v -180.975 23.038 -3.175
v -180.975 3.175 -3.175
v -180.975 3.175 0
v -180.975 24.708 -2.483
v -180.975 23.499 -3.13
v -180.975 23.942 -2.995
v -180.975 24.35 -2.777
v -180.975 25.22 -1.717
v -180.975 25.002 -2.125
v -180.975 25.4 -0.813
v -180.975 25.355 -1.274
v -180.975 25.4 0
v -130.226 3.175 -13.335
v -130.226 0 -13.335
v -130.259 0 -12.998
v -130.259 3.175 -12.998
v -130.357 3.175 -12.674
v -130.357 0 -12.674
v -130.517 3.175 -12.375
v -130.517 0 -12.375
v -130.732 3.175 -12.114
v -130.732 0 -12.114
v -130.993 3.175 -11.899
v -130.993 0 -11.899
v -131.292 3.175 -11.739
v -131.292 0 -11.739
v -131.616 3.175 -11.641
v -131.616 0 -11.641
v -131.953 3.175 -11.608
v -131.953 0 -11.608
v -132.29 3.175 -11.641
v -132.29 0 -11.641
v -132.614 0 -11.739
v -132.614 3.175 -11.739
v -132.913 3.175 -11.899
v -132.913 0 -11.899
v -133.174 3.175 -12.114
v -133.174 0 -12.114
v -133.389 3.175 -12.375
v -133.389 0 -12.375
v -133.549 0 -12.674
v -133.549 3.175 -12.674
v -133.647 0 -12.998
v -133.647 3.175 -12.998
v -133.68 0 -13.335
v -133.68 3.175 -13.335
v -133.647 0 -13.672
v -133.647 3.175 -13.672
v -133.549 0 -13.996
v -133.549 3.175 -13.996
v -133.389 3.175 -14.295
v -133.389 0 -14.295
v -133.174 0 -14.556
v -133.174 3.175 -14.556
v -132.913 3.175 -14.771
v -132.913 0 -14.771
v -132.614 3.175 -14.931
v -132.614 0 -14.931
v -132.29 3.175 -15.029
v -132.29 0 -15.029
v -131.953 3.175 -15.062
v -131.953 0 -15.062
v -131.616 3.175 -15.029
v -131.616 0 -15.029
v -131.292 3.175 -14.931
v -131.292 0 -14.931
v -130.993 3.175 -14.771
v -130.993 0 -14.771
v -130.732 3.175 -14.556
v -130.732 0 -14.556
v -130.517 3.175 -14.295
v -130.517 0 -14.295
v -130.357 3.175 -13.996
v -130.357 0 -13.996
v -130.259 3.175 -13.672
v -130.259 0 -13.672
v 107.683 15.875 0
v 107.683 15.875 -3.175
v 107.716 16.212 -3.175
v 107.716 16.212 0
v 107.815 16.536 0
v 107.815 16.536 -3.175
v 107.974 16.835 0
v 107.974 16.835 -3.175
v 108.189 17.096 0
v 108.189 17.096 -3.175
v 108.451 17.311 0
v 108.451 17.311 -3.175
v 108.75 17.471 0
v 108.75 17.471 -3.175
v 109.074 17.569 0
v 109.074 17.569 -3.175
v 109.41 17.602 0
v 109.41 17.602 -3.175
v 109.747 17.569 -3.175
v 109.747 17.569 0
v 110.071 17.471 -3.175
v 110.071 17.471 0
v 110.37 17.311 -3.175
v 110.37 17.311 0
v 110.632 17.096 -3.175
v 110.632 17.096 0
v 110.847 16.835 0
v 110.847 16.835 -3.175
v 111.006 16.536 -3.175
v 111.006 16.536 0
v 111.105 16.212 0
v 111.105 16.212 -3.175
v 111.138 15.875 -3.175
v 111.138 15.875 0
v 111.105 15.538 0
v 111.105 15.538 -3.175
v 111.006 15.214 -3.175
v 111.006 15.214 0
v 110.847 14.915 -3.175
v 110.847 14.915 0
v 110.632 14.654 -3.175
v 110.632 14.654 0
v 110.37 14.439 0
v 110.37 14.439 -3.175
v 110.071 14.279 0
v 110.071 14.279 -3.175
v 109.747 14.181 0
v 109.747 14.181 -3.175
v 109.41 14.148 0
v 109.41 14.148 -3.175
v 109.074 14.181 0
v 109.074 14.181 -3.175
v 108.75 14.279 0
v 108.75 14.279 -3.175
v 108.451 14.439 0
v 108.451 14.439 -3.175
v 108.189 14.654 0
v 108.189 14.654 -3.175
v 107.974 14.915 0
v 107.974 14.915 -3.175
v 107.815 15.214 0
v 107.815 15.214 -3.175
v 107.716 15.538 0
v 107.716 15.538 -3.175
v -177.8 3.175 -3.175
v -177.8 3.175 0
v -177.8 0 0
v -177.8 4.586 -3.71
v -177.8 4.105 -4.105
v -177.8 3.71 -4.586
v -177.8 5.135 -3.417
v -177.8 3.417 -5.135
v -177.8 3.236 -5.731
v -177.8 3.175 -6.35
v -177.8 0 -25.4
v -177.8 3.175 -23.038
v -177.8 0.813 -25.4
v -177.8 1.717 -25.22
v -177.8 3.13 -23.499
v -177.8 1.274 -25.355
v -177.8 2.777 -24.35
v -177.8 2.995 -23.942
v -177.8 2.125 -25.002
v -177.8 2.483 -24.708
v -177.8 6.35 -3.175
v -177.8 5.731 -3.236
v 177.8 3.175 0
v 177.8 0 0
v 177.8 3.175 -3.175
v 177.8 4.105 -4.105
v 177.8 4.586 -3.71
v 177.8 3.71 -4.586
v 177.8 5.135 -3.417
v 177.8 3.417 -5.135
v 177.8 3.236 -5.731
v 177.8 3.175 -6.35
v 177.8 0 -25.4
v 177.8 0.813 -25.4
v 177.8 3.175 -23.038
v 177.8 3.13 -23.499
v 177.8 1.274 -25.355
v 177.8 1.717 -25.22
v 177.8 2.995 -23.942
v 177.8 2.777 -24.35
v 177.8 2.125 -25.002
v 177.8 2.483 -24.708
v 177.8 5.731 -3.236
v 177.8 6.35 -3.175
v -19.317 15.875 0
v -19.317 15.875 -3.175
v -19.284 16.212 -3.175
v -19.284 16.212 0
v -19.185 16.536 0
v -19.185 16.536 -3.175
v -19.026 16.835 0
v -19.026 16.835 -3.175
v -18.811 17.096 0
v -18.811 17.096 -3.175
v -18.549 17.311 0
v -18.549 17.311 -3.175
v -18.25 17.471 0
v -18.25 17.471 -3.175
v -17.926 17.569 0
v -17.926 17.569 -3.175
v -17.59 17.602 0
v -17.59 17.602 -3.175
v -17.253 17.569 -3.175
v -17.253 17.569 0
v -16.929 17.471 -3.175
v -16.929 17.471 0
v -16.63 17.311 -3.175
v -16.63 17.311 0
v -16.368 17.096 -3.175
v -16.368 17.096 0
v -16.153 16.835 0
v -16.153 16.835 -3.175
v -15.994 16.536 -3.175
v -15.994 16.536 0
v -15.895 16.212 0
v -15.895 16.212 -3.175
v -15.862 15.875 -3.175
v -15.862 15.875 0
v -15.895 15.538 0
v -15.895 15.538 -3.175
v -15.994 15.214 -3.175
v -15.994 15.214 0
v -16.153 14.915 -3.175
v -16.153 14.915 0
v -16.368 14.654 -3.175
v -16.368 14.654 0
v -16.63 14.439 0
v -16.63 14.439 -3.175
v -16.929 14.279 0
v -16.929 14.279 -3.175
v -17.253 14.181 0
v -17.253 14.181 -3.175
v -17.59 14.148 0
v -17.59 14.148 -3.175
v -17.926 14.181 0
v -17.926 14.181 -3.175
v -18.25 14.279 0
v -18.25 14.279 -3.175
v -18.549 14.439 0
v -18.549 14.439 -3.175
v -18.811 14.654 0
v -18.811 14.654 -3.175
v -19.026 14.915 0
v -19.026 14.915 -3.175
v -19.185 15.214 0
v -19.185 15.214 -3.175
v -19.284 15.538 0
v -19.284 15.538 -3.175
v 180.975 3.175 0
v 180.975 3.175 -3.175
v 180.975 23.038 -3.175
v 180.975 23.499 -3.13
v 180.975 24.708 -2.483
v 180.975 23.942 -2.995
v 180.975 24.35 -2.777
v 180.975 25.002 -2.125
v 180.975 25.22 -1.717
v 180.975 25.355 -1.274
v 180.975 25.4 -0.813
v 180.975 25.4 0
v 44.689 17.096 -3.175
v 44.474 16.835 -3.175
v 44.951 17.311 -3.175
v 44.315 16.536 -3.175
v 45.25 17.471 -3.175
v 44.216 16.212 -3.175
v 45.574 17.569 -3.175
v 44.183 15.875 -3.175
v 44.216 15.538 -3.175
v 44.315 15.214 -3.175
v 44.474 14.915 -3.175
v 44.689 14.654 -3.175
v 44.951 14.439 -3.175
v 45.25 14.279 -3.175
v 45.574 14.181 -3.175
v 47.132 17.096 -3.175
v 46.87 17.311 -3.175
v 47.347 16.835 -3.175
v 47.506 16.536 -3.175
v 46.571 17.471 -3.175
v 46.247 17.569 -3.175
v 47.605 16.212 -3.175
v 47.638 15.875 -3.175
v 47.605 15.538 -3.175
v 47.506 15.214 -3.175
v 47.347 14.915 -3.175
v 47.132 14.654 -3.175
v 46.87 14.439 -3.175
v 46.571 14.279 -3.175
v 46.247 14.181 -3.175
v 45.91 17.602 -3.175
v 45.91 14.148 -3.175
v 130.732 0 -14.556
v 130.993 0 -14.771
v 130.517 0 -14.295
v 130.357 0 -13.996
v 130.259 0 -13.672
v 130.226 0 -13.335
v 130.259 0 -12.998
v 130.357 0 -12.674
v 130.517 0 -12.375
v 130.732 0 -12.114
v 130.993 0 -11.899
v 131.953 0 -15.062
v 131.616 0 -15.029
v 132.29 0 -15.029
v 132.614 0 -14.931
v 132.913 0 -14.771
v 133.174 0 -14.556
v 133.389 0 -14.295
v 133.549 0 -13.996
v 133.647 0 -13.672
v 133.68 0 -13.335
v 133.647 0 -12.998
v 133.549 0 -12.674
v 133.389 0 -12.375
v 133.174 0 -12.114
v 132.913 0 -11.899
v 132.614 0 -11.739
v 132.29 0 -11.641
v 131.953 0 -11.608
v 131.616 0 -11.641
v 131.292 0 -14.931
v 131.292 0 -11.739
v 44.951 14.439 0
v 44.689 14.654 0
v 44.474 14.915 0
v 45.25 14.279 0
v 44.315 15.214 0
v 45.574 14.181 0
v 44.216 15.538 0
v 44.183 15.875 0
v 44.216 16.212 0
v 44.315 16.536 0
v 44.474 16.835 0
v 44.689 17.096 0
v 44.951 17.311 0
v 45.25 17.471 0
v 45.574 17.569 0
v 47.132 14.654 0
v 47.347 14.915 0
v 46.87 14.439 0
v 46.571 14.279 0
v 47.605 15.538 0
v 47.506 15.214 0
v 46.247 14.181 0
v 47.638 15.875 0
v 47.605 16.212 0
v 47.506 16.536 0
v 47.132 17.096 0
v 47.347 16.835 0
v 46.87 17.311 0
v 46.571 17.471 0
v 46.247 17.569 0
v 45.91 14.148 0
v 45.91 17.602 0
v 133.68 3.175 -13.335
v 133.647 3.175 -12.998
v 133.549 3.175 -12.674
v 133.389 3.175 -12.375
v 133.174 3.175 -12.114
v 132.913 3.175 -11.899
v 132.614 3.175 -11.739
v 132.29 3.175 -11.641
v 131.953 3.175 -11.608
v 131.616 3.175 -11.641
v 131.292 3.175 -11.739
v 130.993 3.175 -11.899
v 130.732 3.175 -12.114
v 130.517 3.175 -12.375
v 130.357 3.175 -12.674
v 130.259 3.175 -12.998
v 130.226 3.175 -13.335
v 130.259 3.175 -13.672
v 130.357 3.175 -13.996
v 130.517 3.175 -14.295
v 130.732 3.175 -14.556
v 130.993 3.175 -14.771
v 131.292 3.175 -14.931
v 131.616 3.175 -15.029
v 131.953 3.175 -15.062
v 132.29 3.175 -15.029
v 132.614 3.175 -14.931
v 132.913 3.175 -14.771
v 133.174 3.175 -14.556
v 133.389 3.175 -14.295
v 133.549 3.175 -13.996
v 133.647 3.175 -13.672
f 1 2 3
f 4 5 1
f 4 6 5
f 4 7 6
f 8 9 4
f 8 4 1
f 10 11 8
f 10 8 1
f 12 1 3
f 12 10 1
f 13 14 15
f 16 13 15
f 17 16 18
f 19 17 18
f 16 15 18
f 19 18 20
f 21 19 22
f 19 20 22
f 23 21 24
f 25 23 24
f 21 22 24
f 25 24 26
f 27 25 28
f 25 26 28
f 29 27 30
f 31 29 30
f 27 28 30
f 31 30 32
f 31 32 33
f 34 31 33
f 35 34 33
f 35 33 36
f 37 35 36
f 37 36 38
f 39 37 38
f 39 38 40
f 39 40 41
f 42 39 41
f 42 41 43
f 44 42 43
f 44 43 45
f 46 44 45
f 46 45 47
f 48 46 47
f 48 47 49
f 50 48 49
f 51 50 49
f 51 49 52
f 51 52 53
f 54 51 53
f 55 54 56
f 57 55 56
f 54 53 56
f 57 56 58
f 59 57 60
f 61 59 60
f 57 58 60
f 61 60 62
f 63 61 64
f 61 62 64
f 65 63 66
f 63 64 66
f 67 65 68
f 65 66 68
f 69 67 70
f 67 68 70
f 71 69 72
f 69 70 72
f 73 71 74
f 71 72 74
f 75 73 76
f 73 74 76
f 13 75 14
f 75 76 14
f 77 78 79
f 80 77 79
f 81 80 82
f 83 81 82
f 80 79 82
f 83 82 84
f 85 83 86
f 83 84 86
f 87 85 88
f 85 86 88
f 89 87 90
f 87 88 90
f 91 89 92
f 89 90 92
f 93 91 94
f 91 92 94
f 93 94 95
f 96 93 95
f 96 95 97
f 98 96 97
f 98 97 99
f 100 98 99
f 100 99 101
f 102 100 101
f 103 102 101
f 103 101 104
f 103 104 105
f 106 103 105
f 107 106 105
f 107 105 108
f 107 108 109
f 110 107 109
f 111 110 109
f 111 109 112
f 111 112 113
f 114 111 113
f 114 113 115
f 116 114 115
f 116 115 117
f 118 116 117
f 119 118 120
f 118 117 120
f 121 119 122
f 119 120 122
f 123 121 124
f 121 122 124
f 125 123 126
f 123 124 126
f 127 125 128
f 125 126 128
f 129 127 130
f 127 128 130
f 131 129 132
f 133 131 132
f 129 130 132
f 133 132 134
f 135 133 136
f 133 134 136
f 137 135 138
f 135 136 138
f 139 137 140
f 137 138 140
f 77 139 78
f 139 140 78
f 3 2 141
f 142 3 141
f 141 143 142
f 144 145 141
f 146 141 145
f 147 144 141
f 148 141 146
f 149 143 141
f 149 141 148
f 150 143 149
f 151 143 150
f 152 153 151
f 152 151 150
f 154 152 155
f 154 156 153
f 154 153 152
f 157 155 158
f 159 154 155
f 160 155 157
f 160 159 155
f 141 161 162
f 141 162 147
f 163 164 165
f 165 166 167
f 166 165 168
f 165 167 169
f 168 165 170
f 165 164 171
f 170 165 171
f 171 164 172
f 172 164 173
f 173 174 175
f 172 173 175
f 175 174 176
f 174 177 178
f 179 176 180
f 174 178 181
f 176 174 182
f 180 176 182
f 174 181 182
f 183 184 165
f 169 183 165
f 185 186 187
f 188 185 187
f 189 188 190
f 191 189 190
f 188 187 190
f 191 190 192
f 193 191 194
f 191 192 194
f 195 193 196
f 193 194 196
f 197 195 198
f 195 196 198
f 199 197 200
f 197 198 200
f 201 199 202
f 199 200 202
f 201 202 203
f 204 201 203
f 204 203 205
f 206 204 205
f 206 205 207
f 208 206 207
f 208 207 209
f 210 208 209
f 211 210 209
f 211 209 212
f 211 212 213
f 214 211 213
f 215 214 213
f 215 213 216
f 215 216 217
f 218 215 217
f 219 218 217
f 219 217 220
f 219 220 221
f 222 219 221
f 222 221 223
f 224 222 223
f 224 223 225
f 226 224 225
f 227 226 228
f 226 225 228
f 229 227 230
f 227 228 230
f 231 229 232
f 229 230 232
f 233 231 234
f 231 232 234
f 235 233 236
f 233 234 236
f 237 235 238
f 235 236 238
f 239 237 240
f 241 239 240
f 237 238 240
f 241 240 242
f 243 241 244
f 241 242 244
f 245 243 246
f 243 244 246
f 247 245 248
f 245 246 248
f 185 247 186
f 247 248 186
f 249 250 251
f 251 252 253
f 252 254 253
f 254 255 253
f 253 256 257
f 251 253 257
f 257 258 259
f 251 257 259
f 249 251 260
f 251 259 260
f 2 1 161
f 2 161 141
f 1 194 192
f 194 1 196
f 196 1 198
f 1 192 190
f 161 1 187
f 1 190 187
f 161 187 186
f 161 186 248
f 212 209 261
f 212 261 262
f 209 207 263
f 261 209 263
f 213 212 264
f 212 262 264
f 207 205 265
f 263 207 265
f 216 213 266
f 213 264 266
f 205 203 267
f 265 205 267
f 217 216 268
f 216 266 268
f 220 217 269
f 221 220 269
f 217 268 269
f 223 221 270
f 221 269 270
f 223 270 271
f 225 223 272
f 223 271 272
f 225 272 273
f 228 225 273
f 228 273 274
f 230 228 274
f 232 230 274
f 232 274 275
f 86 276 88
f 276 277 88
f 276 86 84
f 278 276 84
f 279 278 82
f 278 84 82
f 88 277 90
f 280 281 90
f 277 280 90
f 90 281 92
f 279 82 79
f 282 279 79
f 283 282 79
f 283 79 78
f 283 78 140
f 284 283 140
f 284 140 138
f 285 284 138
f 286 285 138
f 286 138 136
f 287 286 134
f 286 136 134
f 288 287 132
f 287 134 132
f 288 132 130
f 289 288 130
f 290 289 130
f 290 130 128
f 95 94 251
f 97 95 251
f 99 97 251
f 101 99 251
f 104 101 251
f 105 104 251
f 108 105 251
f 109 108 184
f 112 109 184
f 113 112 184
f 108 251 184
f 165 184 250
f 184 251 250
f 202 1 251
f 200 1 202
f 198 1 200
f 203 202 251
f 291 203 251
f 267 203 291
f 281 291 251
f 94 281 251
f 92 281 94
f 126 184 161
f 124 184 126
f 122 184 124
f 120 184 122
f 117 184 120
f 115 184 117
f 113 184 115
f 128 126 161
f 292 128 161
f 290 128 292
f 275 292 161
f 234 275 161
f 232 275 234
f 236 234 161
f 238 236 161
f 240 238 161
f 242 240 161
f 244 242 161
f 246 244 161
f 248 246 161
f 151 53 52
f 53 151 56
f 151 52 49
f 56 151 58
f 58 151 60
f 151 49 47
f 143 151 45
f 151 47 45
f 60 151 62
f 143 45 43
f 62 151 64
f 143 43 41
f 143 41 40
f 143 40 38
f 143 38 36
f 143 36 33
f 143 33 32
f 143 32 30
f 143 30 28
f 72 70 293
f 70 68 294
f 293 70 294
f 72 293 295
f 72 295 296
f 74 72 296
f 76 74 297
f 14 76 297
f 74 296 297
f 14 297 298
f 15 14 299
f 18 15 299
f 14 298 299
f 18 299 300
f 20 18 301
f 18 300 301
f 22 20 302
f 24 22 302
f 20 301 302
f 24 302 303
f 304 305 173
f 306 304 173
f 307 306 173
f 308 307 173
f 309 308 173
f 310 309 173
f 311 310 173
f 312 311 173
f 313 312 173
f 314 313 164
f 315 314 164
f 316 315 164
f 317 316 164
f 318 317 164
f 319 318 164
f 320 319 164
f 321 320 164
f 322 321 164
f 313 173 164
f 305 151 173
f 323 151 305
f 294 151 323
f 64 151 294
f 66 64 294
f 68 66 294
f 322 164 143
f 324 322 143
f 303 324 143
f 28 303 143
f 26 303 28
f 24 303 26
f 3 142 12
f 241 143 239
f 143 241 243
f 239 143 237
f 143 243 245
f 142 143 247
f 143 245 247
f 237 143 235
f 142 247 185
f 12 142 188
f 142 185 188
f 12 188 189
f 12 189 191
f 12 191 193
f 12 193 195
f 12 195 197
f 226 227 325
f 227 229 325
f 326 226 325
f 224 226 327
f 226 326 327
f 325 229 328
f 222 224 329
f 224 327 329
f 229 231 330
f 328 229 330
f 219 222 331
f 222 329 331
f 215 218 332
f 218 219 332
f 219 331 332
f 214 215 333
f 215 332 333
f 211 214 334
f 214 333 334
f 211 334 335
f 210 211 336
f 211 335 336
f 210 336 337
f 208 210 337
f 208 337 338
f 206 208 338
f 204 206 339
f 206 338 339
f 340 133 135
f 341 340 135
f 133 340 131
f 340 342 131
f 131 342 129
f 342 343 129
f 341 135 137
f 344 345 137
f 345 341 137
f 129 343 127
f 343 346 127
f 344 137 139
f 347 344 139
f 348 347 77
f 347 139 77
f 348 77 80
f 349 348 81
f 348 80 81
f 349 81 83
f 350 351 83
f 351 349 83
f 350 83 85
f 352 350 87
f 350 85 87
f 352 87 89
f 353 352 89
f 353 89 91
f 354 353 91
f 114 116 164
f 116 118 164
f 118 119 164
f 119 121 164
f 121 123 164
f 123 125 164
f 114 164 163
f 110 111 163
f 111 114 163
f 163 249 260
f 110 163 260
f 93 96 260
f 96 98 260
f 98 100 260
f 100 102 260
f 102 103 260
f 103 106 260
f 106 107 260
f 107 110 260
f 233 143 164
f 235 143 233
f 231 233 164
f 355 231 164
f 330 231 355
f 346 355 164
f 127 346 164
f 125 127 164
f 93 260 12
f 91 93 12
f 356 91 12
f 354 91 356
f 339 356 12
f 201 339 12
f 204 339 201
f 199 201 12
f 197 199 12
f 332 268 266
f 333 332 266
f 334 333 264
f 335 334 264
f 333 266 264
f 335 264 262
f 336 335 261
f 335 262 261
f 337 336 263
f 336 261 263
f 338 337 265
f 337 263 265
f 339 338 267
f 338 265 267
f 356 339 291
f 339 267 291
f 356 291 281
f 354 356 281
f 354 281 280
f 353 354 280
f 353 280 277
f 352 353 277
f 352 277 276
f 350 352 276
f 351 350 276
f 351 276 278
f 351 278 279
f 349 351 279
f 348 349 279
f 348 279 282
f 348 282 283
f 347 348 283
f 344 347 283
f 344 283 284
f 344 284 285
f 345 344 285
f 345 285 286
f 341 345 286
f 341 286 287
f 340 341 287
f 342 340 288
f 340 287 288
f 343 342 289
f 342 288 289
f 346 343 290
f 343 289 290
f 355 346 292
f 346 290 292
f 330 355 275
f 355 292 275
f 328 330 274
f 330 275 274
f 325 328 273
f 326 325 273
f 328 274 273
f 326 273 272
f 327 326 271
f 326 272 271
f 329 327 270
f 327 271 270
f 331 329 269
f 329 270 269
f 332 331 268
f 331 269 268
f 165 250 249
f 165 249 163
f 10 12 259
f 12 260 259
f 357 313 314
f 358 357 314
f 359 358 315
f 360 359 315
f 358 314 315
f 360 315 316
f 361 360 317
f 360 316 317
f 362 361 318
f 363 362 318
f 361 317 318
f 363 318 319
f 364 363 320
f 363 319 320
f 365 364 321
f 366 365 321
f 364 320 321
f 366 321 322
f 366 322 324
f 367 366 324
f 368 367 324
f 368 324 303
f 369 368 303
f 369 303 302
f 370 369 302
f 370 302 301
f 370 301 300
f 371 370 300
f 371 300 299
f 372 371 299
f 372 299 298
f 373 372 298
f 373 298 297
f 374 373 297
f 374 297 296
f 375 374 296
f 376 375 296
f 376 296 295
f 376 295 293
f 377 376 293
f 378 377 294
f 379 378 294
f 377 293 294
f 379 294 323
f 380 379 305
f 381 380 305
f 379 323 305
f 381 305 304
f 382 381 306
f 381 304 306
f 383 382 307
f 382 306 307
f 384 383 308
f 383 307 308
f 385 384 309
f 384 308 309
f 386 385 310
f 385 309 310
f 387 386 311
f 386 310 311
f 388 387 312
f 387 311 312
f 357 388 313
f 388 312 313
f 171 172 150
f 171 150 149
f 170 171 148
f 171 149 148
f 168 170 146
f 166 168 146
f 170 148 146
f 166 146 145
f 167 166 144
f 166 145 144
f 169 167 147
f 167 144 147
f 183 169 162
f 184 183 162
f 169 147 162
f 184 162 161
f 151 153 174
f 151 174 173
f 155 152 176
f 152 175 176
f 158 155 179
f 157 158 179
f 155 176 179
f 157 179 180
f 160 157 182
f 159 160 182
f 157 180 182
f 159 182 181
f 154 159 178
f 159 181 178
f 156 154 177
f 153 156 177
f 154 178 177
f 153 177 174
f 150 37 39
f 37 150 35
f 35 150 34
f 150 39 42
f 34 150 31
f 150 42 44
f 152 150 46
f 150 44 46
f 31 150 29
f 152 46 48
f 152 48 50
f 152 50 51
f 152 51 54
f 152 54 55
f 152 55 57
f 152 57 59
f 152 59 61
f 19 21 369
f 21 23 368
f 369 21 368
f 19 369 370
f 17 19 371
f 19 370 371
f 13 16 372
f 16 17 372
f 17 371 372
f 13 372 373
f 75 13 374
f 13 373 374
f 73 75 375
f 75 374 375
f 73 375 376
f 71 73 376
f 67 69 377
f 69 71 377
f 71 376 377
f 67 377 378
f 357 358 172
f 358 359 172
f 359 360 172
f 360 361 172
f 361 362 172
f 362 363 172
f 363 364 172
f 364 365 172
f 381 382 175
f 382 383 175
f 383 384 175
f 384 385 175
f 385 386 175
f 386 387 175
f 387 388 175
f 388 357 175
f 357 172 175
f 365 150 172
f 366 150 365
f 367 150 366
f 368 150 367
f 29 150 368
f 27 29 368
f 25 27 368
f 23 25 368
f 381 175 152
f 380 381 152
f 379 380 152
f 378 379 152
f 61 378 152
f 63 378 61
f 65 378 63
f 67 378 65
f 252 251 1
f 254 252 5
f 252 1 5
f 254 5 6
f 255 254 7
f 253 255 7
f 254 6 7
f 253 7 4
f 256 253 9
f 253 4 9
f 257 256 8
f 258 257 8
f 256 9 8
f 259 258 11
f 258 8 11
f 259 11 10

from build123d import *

# Parameters (mm, degrees)
BOSS_EXTRUDE1_DEPTH       = 180.975
SKETCH3_W                 = 3.175
SKETCH3_H                 = 3.175
CUT_EXTRUDE2_DEPTH        = 185.505475867
F_8_32_TAPPED_HOLE1_D     = 3.4544
F_8_32_TAPPED_HOLE2_D     = 3.4544
F_8_32_TAPPED_HOLE2_DEPTH = 10.668
F_8_32_TAPPED_HOLE2_TIP   = 1.037806461
FILLET1_R                 = 3.175
FILLET2_R                 = 2.3622


with BuildPart() as part:
    # Sketch1 → Boss-Extrude1 (new, symmetric)
    with BuildSketch(Plane(origin=(0, 0, 0), x_dir=(0, 0, -1), z_dir=(1, 0, 0))):
        Polygon((0, 0), (0, 25.4), (3.175, 25.4), (3.175, 3.175), (25.4, 3.175), (25.4, 0), align=None)
    extrude(amount=BOSS_EXTRUDE1_DEPTH, both=True)

    # Sketch3 → Cut-Extrude2 (cut, through all)
    with BuildSketch(Plane(origin=(0, 0, -25.4), x_dir=(-1, 0, 0), z_dir=(0, 0, -1))):
        with Locations((-179.3875, 1.5875)):
            Rectangle(SKETCH3_W, SKETCH3_H)
    cut_extrude2 = extrude(amount=-CUT_EXTRUDE2_DEPTH, mode=Mode.SUBTRACT)

    # Mirror2: Cut-Extrude2 across plane
    add(cut_extrude2.mirror(Plane(origin=(0, 0, 0), x_dir=(0, 0, 1), z_dir=(1, 0, 0))), mode=Mode.SUBTRACT)

    # #8-32 Tapped Hole1 (through all)
    with Locations(Plane.XY):
        with Locations((109.4105, 15.875), (45.9105, 15.875), (-17.5895, 15.875)):
            Hole(F_8_32_TAPPED_HOLE1_D / 2)

    # #8-32 Tapped Hole2
    with Locations(Plane(origin=(0, 3.175, 0), x_dir=(-1, 0, 0), z_dir=(0, 1, 0))):
        with Locations((131.953, -13.335), (-131.953, -13.335)):
            Hole(F_8_32_TAPPED_HOLE2_D / 2, depth=F_8_32_TAPPED_HOLE2_DEPTH)
            with Locations((0, 0, -(F_8_32_TAPPED_HOLE2_DEPTH + F_8_32_TAPPED_HOLE2_TIP / 2))):  # 118° drill point
                Cone(0, F_8_32_TAPPED_HOLE2_D / 2, F_8_32_TAPPED_HOLE2_TIP, mode=Mode.SUBTRACT)

    # Fillet1
    fillet1_edges = [part.edges().sort_by_distance(p)[0] for p in [
        (0, 3.175, -3.175),
    ]]
    fillet(fillet1_edges, radius=FILLET1_R)

    # Fillet2
    fillet2_edges = [part.edges().sort_by_distance(p)[0] for p in [
        (0, 25.4, -3.175),
        (0, 3.175, -25.4),
    ]]
    fillet(fillet2_edges, radius=FILLET2_R)


solid = part.part
